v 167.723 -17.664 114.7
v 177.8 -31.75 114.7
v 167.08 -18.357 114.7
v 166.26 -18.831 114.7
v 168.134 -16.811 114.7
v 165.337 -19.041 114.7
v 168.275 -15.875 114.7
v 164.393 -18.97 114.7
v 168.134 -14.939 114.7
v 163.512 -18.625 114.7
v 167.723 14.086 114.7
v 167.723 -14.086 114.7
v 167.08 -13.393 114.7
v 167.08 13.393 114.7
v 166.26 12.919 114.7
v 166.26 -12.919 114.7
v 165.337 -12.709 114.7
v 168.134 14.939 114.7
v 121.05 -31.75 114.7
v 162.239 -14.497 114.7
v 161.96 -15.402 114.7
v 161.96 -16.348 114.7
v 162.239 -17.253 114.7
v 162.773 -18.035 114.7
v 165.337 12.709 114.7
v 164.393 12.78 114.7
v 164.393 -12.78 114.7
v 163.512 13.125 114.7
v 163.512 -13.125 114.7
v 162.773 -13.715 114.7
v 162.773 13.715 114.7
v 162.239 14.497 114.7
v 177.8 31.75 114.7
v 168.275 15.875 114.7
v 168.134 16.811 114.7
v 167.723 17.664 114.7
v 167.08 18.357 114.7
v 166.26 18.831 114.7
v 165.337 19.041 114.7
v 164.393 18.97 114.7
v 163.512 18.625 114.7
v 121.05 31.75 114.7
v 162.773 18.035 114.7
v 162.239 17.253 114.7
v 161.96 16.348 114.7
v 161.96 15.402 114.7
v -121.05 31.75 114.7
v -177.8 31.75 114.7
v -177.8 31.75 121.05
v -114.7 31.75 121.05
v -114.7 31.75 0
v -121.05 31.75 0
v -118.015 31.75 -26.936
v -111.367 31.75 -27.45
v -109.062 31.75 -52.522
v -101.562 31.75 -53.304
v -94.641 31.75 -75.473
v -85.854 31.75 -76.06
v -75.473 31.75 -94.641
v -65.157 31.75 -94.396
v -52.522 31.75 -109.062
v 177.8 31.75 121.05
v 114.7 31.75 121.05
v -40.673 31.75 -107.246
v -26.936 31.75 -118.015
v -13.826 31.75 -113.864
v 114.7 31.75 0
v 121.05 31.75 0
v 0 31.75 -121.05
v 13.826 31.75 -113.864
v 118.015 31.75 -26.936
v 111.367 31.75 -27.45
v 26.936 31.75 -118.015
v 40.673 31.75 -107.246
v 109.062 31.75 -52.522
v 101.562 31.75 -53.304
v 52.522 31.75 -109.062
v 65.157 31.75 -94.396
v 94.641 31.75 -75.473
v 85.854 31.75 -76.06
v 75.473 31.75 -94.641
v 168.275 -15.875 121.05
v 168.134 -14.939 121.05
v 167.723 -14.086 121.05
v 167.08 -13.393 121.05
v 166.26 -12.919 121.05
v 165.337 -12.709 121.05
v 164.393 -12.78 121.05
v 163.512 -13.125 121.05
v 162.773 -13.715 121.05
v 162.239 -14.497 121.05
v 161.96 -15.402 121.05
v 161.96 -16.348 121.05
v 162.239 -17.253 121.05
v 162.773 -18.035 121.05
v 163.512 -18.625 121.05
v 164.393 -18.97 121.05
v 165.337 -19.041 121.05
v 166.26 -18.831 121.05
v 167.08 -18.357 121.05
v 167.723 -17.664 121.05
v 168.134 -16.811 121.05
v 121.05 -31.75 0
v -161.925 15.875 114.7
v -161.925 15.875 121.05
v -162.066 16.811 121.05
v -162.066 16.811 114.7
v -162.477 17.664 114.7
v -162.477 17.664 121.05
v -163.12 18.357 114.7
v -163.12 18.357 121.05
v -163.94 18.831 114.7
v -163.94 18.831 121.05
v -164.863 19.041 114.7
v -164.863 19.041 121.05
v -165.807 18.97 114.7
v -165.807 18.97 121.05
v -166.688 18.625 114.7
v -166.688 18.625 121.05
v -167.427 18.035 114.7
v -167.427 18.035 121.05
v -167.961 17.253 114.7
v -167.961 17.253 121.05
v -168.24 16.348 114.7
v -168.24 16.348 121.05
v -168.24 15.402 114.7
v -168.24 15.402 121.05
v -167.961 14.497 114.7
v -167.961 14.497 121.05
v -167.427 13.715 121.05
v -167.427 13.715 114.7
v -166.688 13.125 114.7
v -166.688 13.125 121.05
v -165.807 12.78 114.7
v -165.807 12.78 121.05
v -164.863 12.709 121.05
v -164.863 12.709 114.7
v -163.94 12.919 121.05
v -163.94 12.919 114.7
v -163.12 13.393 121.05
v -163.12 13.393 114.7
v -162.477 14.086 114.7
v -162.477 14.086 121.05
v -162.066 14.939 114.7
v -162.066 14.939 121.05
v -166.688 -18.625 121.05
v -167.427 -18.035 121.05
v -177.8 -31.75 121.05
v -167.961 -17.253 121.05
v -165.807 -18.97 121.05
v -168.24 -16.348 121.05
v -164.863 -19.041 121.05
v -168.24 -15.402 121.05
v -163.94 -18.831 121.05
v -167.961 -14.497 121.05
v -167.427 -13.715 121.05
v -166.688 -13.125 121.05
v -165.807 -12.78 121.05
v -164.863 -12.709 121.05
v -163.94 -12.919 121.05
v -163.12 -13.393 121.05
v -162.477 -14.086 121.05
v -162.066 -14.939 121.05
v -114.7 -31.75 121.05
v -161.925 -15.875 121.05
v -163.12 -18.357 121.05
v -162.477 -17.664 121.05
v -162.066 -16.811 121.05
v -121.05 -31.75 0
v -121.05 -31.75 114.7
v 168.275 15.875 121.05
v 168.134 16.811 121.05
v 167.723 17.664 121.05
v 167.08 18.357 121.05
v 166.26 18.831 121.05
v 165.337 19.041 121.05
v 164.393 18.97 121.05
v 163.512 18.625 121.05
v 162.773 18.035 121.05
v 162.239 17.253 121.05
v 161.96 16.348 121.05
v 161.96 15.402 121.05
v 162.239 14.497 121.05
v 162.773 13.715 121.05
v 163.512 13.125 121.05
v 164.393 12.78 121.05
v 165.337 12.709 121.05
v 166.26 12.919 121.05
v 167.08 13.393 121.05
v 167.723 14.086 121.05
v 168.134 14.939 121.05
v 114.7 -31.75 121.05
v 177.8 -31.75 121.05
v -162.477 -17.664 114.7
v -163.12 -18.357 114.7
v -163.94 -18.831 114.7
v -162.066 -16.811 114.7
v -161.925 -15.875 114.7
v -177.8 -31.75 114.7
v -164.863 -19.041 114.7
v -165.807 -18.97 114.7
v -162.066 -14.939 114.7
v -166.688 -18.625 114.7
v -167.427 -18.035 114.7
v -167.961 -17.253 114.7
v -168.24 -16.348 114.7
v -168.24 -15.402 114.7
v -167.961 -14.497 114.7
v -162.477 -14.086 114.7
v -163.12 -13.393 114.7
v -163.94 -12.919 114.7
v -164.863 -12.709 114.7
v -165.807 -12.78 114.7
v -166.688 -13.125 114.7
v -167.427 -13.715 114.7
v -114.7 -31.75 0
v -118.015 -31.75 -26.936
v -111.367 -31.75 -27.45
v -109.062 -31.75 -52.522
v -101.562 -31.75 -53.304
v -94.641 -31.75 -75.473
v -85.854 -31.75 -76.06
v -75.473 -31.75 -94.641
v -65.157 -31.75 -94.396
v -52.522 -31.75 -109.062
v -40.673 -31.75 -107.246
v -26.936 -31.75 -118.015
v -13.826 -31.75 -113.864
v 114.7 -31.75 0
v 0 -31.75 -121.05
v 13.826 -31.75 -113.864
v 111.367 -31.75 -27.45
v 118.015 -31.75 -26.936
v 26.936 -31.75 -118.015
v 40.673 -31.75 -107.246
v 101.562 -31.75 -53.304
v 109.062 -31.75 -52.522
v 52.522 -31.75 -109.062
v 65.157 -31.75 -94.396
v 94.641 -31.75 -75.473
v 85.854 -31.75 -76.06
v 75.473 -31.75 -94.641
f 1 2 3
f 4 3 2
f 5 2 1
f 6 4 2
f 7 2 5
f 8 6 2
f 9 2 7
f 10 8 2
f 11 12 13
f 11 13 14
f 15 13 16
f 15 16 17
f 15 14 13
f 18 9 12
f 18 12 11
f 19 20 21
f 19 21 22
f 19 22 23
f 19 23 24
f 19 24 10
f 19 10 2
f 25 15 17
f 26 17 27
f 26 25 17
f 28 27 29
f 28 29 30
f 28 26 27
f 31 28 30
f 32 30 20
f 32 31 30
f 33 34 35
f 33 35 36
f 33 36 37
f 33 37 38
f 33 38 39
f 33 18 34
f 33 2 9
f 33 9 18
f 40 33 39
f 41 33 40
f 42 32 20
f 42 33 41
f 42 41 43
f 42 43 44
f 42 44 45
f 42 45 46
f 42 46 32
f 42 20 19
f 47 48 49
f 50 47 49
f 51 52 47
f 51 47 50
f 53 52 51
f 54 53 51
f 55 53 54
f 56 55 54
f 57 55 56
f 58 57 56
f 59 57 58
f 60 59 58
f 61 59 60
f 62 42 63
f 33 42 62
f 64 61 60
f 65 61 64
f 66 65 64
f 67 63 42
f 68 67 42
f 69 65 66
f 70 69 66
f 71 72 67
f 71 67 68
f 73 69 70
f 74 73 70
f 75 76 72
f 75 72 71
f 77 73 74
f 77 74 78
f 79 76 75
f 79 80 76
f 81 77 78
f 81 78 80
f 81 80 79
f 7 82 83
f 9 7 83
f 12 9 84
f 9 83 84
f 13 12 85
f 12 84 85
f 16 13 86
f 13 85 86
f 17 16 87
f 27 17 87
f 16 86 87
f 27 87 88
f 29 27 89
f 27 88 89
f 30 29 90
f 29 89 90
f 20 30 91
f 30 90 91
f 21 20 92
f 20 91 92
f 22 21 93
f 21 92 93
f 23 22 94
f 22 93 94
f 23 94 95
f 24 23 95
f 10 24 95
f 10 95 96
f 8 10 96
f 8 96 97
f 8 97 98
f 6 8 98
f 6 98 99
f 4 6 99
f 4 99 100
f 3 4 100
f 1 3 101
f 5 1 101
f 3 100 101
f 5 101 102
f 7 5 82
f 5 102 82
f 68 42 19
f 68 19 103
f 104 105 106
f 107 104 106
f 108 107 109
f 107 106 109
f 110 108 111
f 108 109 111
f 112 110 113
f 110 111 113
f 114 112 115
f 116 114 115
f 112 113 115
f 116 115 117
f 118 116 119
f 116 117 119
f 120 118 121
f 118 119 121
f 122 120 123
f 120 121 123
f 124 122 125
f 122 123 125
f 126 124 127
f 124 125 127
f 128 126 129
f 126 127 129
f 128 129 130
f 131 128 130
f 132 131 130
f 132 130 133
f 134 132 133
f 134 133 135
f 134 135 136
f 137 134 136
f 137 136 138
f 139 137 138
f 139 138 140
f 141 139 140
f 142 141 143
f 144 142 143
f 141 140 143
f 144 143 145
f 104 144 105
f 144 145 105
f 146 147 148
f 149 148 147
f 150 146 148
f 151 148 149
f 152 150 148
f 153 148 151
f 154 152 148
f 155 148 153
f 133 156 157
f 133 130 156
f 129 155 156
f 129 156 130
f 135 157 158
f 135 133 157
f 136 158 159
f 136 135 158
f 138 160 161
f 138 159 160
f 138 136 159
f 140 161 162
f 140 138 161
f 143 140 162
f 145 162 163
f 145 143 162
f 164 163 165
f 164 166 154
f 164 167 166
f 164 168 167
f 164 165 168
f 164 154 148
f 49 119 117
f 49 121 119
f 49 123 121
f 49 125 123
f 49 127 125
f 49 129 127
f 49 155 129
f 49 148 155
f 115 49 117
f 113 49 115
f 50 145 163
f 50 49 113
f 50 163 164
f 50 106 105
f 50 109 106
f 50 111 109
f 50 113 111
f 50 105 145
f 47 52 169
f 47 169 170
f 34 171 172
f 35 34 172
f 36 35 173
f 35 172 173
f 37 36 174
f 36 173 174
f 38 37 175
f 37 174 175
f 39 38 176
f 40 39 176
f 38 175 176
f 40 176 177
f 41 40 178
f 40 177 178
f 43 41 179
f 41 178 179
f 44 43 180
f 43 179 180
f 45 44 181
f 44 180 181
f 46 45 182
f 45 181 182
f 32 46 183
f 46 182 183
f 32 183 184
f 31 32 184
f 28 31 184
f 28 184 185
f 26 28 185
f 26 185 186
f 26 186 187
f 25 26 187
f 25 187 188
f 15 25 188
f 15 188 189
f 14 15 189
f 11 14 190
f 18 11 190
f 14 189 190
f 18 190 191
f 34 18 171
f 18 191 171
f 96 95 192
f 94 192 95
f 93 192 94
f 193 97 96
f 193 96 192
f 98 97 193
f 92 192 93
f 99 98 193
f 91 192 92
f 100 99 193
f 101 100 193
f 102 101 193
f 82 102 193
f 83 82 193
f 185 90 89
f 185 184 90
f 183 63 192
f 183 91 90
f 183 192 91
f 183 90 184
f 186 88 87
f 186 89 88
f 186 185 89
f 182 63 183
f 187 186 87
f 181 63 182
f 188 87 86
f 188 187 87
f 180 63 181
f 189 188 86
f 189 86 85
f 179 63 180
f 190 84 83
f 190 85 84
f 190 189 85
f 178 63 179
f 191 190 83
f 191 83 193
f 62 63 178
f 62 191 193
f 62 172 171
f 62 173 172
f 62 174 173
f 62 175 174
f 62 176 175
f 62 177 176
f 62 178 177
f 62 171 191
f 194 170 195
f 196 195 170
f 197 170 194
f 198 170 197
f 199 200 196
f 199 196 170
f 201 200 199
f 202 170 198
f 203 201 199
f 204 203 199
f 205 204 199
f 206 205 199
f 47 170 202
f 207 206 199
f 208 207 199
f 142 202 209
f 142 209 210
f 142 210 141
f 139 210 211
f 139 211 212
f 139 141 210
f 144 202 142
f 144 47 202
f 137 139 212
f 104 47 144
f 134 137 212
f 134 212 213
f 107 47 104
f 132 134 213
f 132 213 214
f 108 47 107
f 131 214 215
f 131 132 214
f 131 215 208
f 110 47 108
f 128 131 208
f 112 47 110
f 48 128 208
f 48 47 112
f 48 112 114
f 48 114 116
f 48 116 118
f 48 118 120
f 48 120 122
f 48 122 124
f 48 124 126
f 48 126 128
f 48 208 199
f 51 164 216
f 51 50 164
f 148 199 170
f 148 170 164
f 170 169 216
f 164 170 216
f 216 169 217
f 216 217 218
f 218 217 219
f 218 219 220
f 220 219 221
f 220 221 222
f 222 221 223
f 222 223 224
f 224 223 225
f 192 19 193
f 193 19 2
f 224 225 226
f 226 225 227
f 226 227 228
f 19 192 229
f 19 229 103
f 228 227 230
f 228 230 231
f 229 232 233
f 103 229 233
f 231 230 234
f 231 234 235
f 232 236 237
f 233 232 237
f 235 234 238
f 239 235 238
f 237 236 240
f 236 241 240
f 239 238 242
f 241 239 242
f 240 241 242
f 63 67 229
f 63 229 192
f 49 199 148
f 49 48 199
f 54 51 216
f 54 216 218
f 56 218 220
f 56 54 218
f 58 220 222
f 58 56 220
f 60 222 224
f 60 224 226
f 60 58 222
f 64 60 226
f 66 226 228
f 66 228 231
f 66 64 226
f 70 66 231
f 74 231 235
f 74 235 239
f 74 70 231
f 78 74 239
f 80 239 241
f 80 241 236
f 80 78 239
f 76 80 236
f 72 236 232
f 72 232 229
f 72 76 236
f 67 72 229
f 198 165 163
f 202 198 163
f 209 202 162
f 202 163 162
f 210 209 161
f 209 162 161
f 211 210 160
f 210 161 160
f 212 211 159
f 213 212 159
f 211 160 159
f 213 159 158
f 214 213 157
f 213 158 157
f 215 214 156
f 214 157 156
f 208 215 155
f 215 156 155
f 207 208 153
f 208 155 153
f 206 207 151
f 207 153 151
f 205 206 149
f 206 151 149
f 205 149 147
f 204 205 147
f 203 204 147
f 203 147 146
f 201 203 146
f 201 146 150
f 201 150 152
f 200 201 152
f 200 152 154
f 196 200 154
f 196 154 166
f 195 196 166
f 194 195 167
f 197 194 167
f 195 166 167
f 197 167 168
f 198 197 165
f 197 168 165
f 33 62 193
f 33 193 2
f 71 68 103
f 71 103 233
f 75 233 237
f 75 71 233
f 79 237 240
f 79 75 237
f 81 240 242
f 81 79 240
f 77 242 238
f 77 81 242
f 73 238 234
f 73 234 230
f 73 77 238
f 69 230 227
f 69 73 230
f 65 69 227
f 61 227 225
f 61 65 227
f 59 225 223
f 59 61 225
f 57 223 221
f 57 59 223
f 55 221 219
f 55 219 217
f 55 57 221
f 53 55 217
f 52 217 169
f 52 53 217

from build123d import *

# Parameters (mm, degrees)
BOSS_EXTRUDE1_DEPTH = 31.75
SKETCH3_R           = 3.175
CUT_EXTRUDE2_DEPTH  = 6.35


with BuildPart() as part:
    # Sketch1 → Boss-Extrude1 (new, symmetric)
    with BuildSketch(Plane(origin=(0, 0, 0), x_dir=(1, 0, 0), z_dir=(0, 1, 0))):
        with BuildLine():
            Line((-114.7, -121.05), (-114.7, 0))
            ThreePointArc((-114.7, 0), (0, 114.7), (114.7, 0))
            Line((114.7, 0), (114.7, -121.05))
            Line((114.7, -121.05), (177.8, -121.05))
            Line((177.8, -121.05), (177.8, -114.7))
            Line((177.8, -114.7), (121.05, -114.7))
            Line((121.05, -114.7), (121.05, 0))
            ThreePointArc((121.05, 0), (0, 121.05), (-121.05, 0))
            Line((-121.05, 0), (-121.05, -12.7))
            Line((-121.05, -12.7), (-121.05, -114.7))
            Line((-121.05, -114.7), (-177.8, -114.7))
            Line((-177.8, -114.7), (-177.8, -121.05))
            Line((-177.8, -121.05), (-114.7, -121.05))
        make_face()
    extrude(amount=BOSS_EXTRUDE1_DEPTH, both=True)

    # Sketch3 → Cut-Extrude2 (cut)
    with BuildSketch(Plane.XY.offset(121.05)):
        with Locations((-165.1, 15.875)):
            Circle(SKETCH3_R)
        with Locations((-165.1, -15.875)):
            Circle(SKETCH3_R)
        with Locations((165.1, -15.875)):
            Circle(SKETCH3_R)
        with Locations((165.1, 15.875)):
            Circle(SKETCH3_R)
    extrude(amount=-CUT_EXTRUDE2_DEPTH, mode=Mode.SUBTRACT)


solid = part.part
